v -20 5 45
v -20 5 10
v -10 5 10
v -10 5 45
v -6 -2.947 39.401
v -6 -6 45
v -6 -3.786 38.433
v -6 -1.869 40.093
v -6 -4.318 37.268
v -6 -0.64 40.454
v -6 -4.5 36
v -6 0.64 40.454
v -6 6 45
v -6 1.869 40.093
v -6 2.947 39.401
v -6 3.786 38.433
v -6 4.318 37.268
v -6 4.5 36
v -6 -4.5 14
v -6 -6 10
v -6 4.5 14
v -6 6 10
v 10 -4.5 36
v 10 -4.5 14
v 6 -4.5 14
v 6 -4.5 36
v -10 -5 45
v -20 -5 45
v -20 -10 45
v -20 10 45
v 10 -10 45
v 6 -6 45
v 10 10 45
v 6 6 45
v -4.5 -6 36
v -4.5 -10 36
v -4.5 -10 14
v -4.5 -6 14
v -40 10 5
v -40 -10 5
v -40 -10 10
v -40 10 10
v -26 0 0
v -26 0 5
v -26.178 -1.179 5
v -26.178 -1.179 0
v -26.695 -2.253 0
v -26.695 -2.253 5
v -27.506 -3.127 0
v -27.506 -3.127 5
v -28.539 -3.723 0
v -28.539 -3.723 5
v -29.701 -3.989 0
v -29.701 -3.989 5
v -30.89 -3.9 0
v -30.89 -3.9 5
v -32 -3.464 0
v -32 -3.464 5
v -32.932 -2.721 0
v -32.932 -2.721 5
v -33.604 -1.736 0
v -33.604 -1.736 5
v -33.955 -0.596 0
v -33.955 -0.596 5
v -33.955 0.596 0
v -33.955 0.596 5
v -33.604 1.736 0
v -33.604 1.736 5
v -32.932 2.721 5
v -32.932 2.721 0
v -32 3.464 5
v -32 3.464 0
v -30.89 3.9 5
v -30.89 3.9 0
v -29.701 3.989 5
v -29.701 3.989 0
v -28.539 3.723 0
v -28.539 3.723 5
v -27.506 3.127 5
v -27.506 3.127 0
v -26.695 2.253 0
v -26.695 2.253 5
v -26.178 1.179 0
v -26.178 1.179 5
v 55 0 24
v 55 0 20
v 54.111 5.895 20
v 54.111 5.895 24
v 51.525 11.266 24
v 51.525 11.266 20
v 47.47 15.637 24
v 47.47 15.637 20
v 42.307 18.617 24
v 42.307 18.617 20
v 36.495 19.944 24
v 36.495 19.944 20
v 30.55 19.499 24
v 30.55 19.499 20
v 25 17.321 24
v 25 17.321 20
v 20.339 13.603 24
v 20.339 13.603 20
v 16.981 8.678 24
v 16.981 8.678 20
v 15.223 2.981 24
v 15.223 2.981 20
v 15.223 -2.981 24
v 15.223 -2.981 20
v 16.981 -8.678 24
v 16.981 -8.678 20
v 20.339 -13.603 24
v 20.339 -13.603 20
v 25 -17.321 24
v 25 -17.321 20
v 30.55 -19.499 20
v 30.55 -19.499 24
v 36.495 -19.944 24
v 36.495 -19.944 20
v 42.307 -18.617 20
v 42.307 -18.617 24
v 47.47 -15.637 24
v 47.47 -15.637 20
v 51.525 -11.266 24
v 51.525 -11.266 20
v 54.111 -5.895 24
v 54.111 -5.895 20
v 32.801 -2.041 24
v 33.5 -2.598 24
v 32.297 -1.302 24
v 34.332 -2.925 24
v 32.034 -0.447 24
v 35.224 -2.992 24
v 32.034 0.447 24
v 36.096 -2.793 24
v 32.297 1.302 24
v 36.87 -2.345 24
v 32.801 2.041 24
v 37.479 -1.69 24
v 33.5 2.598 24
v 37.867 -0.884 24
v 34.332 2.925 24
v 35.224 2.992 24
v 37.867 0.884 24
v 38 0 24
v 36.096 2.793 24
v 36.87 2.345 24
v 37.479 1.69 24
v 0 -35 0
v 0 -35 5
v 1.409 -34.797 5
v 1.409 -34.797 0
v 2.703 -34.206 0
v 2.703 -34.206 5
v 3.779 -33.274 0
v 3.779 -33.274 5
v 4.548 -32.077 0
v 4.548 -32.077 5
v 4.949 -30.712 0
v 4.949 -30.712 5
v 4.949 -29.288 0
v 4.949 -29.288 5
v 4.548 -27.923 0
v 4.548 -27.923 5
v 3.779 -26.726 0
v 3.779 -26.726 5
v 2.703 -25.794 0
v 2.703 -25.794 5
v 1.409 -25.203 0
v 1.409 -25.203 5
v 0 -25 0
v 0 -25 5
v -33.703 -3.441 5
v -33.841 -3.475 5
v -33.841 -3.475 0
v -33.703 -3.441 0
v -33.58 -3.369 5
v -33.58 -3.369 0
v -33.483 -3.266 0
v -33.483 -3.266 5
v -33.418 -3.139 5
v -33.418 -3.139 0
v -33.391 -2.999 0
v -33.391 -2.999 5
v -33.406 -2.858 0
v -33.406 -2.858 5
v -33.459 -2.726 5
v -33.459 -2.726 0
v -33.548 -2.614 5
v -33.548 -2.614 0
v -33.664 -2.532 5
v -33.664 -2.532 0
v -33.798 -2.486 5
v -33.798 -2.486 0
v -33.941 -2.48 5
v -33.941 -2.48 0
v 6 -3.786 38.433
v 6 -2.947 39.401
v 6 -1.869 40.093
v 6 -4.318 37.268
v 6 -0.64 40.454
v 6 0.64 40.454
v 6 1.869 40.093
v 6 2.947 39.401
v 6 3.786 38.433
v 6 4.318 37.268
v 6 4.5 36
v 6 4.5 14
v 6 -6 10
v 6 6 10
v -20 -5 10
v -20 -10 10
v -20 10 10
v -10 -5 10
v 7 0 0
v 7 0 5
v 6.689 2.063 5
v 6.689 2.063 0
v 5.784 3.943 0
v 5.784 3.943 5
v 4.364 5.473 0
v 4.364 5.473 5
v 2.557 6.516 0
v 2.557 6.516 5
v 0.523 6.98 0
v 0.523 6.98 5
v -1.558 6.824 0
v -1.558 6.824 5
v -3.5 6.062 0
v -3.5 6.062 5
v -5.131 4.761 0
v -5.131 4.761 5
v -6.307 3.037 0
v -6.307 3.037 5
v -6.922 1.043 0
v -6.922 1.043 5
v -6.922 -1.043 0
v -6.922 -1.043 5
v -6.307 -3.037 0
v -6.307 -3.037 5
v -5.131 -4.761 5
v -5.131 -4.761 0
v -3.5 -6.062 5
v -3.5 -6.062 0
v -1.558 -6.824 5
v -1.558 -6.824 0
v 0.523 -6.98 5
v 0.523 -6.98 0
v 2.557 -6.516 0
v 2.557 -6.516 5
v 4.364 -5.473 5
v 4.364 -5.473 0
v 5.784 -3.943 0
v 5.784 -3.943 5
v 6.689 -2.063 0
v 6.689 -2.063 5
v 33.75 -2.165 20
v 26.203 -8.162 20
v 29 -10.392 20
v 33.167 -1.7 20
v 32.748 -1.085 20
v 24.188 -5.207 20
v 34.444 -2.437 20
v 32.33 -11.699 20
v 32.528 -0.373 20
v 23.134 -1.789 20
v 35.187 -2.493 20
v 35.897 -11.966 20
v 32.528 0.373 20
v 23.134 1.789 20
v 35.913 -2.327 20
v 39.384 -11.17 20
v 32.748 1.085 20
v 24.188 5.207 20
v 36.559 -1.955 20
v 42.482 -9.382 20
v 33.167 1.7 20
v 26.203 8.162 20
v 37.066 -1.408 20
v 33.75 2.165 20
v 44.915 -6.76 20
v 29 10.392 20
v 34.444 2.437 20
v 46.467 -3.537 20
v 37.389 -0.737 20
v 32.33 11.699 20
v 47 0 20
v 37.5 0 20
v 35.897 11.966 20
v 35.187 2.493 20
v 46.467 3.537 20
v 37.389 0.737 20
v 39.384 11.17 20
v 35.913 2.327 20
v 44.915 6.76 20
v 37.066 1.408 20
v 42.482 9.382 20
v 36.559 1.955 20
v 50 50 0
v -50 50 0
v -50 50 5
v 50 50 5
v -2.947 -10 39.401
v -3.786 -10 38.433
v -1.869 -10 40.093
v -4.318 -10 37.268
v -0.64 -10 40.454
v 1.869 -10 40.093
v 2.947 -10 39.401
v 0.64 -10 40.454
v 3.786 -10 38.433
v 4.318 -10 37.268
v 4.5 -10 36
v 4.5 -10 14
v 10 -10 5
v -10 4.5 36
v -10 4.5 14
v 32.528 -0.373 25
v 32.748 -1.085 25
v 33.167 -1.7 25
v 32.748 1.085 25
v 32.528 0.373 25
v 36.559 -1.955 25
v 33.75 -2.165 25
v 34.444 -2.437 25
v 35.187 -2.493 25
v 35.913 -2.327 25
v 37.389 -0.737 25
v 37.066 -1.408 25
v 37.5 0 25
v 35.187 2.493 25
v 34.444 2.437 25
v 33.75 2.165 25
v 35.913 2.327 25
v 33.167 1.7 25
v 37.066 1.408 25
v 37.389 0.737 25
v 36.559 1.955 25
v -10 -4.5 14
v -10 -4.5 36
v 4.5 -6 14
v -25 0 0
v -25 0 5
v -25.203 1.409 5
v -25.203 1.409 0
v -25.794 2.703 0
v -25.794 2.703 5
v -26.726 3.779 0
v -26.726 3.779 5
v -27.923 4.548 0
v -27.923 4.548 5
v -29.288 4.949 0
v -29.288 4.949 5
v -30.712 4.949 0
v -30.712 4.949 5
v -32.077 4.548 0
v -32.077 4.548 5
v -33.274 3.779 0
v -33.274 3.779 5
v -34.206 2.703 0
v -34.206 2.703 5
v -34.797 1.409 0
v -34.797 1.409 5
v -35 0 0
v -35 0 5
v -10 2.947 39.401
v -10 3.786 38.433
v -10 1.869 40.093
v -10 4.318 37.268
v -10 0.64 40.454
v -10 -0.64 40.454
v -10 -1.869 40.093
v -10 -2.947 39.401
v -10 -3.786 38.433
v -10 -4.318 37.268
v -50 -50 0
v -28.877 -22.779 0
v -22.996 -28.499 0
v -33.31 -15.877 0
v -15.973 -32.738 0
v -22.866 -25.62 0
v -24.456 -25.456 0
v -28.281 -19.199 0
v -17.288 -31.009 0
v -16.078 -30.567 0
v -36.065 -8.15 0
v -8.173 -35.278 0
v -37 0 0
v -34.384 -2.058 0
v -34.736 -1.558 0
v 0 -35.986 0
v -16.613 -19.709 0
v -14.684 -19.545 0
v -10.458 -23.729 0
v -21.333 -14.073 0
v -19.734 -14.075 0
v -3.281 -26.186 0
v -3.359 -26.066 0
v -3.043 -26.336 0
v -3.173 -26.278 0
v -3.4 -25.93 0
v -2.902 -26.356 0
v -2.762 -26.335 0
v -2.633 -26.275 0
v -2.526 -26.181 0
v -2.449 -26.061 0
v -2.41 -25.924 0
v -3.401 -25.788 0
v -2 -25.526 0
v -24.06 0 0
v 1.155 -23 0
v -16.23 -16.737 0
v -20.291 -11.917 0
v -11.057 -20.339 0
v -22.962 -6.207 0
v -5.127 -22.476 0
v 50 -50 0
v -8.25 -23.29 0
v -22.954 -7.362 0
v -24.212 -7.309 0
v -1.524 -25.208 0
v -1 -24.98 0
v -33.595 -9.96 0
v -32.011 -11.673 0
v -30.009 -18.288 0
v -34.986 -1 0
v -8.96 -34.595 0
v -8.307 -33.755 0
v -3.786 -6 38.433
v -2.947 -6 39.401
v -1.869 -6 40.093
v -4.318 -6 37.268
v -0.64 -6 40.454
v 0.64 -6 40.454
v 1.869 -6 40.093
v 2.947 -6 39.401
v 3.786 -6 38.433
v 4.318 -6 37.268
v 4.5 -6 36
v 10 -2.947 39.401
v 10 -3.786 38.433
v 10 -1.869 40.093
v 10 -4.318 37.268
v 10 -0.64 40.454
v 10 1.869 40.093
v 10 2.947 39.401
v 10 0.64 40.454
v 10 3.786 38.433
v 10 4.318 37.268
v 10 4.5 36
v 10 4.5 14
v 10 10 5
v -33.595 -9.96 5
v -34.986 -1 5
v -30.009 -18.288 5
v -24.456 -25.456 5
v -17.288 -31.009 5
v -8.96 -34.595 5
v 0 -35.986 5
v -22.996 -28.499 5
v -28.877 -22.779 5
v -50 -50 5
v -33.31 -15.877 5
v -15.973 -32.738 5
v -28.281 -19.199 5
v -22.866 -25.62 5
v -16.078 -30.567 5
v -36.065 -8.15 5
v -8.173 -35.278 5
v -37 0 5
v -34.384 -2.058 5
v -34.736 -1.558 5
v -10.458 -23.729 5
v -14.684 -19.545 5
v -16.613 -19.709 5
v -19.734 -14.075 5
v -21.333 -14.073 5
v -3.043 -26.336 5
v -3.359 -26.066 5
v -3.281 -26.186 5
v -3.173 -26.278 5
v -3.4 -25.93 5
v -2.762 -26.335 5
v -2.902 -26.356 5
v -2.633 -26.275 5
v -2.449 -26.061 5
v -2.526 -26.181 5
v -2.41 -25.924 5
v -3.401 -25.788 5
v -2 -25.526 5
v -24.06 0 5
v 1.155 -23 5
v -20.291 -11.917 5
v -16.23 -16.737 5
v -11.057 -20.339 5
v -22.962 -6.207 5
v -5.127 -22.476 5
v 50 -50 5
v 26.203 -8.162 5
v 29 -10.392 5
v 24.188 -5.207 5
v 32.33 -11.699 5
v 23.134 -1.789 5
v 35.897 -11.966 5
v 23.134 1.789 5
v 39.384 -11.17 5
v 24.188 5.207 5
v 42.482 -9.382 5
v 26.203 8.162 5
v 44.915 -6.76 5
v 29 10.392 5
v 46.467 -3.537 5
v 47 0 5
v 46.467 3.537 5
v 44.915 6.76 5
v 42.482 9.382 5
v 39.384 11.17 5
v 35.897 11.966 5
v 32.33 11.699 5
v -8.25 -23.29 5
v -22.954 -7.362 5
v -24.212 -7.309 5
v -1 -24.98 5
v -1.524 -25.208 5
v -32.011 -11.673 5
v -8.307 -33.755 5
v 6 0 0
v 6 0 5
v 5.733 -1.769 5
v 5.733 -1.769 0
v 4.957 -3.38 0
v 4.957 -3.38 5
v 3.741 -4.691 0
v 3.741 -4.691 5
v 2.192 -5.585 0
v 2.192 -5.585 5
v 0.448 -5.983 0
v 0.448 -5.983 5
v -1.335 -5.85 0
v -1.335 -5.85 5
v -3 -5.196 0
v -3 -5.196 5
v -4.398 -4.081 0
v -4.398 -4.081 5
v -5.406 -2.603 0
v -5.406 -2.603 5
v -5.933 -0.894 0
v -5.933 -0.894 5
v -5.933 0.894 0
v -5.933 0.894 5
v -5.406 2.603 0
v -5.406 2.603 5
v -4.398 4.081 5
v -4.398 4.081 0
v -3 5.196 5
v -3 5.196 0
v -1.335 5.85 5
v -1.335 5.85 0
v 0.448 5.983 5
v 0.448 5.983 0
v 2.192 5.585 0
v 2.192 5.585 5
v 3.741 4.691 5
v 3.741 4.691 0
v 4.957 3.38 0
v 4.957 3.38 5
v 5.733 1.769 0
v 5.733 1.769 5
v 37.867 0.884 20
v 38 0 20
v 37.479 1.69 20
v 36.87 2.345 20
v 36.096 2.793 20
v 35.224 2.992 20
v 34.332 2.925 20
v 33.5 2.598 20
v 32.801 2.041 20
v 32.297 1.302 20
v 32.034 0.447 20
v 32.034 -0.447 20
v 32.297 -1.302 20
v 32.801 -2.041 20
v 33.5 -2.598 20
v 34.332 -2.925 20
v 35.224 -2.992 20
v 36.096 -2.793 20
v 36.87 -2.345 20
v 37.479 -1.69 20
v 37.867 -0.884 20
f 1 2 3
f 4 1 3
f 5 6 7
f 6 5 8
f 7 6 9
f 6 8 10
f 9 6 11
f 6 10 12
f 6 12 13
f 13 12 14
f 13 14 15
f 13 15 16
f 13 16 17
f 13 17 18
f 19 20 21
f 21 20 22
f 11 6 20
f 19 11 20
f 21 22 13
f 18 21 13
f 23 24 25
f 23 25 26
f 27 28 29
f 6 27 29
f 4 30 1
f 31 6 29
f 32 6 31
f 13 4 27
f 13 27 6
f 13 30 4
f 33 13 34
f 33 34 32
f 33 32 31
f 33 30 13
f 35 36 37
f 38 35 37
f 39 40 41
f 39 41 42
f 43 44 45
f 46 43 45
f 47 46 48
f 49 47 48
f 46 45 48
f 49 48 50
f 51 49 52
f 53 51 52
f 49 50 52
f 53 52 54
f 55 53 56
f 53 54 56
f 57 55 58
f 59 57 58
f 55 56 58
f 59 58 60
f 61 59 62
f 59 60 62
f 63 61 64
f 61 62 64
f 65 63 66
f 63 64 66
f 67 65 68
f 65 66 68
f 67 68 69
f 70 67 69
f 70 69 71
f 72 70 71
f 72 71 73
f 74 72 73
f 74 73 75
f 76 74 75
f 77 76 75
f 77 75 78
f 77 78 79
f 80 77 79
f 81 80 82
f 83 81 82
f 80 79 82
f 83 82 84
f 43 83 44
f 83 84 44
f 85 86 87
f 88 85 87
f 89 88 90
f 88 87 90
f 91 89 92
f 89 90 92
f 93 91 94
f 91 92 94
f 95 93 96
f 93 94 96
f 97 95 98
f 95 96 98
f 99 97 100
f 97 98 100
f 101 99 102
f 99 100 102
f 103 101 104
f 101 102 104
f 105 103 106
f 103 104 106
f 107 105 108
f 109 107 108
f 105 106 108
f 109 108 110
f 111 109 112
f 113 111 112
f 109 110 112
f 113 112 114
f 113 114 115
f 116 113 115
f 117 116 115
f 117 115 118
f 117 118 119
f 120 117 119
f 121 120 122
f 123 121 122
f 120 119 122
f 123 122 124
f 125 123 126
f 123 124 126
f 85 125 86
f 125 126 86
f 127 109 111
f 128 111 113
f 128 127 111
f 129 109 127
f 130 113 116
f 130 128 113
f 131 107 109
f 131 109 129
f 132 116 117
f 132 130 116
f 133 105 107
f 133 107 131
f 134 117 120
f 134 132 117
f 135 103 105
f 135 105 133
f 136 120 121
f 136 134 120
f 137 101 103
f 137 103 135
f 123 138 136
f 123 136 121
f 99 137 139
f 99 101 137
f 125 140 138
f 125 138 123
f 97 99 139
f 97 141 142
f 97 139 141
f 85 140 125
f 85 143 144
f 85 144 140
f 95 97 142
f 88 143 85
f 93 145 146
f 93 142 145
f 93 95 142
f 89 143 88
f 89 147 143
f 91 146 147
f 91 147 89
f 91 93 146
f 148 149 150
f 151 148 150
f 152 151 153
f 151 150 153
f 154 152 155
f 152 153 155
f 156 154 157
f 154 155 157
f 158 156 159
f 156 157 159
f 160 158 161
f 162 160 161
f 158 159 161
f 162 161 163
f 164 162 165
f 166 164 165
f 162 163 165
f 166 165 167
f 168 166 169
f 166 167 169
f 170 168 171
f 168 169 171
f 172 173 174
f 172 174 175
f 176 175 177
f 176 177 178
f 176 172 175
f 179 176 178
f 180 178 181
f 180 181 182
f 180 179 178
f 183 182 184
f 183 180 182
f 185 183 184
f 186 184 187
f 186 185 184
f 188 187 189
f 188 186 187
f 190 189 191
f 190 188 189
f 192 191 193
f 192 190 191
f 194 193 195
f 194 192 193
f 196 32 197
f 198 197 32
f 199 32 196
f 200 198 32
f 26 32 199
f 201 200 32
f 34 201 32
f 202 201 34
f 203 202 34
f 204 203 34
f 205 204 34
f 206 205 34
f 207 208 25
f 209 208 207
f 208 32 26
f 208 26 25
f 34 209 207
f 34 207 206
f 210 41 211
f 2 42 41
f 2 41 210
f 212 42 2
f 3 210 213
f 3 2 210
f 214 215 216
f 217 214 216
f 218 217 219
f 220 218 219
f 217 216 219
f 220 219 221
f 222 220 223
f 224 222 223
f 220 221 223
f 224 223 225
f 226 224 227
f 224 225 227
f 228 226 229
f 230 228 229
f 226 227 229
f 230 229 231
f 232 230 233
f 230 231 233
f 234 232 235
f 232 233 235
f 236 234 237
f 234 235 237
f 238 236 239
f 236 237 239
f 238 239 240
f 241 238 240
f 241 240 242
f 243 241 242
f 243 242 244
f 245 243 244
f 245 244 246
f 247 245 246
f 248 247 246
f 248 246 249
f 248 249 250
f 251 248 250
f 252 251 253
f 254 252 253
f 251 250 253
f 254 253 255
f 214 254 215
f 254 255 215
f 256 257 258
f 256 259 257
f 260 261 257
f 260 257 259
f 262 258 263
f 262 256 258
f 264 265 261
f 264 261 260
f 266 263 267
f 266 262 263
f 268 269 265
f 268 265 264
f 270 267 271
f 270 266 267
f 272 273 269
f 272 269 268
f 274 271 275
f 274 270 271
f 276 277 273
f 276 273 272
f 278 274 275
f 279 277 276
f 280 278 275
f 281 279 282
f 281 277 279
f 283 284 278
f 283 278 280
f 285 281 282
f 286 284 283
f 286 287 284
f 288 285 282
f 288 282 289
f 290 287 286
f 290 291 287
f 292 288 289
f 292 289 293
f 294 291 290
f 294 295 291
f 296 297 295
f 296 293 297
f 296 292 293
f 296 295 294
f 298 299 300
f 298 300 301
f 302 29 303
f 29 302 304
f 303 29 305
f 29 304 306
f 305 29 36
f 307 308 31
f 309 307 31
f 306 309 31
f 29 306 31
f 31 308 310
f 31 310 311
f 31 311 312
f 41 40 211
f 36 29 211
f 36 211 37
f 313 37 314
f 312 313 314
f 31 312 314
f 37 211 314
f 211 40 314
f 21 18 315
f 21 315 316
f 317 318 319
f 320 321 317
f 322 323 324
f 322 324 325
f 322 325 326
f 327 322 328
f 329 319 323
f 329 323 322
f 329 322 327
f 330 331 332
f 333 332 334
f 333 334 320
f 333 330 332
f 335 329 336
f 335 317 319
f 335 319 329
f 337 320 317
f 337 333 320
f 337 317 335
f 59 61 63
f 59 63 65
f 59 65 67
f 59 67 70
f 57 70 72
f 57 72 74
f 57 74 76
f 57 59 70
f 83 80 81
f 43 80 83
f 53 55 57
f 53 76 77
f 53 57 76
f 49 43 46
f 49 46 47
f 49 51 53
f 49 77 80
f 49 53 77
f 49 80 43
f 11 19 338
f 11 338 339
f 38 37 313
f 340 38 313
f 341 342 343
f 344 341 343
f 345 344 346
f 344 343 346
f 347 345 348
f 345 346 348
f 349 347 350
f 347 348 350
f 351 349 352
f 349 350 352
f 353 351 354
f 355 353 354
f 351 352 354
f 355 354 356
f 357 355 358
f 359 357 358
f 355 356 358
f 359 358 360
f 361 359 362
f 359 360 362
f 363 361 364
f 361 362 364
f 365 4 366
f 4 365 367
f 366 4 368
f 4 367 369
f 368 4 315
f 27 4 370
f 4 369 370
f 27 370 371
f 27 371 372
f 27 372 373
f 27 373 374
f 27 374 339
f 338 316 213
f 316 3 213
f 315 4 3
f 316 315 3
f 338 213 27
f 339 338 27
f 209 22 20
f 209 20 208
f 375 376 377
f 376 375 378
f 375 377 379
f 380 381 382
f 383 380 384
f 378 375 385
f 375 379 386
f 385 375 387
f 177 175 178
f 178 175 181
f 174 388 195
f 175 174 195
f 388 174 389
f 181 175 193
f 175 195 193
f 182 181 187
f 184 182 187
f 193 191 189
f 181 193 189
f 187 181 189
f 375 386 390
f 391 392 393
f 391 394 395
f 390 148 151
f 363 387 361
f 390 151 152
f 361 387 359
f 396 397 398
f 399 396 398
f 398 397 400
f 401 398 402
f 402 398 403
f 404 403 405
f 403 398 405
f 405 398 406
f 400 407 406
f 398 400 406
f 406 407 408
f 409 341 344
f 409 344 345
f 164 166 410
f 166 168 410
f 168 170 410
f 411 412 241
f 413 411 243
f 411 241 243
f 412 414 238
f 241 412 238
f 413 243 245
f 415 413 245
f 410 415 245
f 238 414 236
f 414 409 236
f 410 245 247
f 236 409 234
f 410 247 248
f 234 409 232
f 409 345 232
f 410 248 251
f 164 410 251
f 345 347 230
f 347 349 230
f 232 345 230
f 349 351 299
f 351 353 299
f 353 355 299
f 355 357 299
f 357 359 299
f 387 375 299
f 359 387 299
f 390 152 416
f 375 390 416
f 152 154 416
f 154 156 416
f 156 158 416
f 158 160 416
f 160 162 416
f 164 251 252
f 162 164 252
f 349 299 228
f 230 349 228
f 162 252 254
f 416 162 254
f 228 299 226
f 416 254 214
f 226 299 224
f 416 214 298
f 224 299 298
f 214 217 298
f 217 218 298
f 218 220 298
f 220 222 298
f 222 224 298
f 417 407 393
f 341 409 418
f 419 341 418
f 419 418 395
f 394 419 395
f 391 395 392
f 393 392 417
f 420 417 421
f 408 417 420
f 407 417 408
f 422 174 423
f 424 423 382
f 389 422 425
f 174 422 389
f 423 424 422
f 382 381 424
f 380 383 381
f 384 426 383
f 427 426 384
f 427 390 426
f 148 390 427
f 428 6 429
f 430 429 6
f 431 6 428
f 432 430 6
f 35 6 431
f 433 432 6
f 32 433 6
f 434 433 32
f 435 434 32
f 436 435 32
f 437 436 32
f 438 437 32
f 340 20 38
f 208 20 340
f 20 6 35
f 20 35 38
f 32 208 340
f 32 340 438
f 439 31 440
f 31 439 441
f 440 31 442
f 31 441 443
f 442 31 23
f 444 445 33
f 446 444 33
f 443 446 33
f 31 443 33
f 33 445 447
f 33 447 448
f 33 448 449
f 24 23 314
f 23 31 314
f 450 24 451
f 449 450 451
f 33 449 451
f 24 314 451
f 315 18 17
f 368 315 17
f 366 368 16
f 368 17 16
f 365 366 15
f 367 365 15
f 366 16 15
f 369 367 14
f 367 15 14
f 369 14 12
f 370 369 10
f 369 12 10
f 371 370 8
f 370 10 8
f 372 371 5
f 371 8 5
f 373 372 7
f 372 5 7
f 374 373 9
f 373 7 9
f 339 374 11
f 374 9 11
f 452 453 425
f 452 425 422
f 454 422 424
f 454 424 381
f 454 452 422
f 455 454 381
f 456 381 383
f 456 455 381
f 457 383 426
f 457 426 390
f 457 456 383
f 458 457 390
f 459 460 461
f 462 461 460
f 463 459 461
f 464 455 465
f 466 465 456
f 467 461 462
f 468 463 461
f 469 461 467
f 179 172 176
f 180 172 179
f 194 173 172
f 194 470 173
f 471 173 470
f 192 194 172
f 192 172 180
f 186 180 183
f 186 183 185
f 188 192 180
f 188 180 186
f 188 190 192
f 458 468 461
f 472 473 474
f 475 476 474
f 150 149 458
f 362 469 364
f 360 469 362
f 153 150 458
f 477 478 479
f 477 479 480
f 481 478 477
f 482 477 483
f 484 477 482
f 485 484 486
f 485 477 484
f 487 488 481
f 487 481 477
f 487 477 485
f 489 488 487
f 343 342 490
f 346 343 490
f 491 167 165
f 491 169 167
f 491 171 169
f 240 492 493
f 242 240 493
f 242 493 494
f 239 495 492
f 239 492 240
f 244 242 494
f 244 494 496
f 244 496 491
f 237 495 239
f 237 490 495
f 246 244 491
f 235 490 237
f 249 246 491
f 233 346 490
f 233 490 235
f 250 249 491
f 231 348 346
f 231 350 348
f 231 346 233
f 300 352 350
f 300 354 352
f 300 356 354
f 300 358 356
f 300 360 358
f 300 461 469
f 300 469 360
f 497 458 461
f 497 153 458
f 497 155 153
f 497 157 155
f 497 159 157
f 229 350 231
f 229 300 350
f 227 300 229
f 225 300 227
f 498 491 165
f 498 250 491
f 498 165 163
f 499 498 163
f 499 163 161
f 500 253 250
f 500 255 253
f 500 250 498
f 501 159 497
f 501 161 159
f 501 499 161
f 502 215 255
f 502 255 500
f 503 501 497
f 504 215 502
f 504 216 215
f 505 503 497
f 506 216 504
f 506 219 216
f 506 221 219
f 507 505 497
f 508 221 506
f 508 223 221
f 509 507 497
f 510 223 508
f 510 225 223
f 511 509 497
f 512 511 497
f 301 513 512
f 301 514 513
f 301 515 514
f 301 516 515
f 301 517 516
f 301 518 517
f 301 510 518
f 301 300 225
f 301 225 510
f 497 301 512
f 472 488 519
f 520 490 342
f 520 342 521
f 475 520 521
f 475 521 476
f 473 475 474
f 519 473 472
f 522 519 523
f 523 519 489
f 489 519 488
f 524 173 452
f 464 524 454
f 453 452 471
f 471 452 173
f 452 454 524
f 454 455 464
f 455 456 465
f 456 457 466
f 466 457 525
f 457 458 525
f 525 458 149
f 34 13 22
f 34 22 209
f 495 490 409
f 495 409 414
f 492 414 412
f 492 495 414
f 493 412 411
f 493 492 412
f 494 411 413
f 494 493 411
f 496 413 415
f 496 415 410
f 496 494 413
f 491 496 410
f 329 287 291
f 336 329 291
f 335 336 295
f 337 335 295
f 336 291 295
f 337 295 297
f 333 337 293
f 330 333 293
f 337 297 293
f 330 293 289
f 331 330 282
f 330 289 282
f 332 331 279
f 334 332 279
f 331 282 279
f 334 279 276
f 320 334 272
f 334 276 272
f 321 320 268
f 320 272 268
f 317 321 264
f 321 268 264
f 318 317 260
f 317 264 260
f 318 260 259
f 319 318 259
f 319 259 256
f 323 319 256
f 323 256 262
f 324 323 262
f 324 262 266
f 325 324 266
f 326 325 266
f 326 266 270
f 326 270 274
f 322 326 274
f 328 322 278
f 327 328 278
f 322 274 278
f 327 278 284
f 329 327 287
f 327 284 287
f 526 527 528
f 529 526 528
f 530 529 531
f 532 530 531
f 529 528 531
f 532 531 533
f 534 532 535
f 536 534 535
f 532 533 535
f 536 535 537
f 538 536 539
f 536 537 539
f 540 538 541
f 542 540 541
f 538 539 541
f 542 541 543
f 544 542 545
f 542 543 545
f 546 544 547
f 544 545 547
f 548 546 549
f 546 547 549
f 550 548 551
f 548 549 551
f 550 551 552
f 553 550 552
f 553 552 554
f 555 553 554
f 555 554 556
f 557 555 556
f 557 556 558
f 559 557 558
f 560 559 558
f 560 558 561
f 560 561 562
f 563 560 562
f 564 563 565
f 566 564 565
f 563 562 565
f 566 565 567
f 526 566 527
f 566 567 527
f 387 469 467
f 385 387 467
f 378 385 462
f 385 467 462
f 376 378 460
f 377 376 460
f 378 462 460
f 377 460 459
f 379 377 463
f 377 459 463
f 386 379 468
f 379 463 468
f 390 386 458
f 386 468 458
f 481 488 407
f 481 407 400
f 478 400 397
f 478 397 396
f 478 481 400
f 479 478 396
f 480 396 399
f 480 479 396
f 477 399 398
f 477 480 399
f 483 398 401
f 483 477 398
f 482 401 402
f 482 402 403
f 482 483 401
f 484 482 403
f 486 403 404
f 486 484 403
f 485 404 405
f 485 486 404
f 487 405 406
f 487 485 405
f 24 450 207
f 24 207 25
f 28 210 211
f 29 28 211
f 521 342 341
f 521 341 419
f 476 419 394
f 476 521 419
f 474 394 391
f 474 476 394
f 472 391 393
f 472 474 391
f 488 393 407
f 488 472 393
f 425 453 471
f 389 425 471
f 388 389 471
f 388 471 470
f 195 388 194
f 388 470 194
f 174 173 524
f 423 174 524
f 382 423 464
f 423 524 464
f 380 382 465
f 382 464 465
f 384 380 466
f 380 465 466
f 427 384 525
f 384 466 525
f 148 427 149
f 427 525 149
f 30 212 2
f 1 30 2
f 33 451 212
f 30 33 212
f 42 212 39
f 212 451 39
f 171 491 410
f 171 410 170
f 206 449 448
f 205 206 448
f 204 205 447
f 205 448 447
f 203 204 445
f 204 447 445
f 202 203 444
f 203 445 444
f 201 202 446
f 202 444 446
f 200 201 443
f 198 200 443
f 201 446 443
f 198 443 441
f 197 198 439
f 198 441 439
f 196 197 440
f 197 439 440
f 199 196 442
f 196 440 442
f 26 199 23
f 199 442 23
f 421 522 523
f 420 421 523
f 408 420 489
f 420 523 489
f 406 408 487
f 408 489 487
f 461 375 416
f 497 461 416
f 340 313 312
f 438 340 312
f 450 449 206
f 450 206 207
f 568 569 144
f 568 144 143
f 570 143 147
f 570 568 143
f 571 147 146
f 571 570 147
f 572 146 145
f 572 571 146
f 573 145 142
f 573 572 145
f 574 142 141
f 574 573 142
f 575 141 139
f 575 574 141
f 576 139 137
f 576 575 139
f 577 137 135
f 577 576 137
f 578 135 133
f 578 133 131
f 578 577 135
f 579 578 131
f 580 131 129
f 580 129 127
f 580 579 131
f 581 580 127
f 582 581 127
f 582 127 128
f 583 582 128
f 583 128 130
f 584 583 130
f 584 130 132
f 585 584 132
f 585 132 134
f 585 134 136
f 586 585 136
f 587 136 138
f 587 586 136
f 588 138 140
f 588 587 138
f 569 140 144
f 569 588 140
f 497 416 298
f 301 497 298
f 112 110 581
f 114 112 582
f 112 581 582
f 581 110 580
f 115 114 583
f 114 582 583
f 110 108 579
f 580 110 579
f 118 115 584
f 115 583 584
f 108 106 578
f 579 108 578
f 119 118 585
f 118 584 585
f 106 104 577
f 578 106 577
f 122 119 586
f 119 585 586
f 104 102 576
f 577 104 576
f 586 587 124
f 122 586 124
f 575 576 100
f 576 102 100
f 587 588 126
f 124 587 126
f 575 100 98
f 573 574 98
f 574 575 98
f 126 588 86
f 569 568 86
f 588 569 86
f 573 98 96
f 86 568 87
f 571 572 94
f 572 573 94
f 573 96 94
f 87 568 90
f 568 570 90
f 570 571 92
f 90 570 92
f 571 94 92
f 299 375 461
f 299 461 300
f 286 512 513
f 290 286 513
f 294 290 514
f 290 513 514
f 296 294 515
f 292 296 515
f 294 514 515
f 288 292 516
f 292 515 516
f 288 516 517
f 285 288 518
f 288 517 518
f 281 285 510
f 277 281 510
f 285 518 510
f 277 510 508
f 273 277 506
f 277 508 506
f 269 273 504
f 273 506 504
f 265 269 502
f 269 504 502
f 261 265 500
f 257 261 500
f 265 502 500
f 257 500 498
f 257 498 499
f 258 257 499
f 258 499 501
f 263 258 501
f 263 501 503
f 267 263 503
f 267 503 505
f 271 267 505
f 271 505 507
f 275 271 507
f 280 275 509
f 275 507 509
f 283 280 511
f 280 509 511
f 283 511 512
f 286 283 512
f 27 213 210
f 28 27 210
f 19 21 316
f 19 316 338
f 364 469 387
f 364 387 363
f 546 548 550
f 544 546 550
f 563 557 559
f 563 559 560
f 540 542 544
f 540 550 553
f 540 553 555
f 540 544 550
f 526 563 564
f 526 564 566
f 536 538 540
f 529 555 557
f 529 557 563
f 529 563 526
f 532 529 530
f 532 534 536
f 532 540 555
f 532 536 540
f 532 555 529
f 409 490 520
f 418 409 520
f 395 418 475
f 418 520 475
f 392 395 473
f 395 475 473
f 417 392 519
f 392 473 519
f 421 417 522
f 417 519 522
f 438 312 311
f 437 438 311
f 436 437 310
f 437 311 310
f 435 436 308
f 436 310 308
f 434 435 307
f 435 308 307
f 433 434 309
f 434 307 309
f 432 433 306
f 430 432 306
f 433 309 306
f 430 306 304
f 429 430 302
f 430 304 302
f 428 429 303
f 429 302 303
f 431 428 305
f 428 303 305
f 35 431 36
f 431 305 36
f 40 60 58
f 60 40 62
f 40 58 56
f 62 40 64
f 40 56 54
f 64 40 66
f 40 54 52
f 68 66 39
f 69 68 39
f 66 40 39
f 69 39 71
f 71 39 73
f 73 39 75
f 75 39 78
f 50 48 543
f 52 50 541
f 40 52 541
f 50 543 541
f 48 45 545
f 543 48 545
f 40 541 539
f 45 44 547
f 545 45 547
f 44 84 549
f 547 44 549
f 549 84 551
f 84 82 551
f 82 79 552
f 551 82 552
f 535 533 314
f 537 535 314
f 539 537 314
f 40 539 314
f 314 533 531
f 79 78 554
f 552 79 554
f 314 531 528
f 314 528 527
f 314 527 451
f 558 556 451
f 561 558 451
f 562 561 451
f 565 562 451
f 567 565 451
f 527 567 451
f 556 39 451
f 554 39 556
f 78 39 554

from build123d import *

# Parameters (mm, degrees)
SKETCH_W        = 100
SKETCH_H        = 100
PAD_DEPTH       = 5
SKETCH001_R     = 7
POCKET_DEPTH    = 5
SKETCH007_R     = 12
PAD004_DEPTH    = 15
SKETCH008_R     = 2.5
PAD005_DEPTH    = 5
SKETCH002_W     = 50
SKETCH002_H     = 20
PAD001_DEPTH    = 5
SKETCH003_R     = 6
SKETCH003_R_2   = 4
PAD002_DEPTH    = 5
SKETCH004_W     = 12
SKETCH004_H     = 12
PAD003_DEPTH    = 35
POCKET001_DEPTH = 20
POCKET002_DEPTH = 4
SKETCH009_R     = 20
SKETCH009_R_2   = 3
PAD006_DEPTH    = 4


with BuildPart() as plt:
    # Sketch → Pad (new body)
    with BuildSketch(Plane.XY):
        Rectangle(SKETCH_W, SKETCH_H)
    extrude(amount=PAD_DEPTH)

    # Sketch001 (on Face6 of Pad) → Pocket (cut)
    with BuildSketch(Plane.XY.offset(5)):
        Circle(SKETCH001_R)
        with BuildLine():
            ThreePointArc((-25, 0), (-30, 5), (-35, 0))
            Line((-37, 0), (-35, 0))
            ThreePointArc((-37, 0), (-26.099801, -25.806976), (0, -35.986108))
            ThreePointArc((-34.986108, -1), (-24.455844, -25.455844), (0, -35.986108))
            ThreePointArc((-34.986108, -1), (-34.572138, -1.816852), (-33.940654, -2.480062))
            ThreePointArc((-33.841405, -3.475124), (-33.393498, -2.927969), (-33.940654, -2.480062))
            ThreePointArc((-33.841405, -3.475124), (-22.86642, -25.620187), (0, -35))
            ThreePointArc((0, -35), (5, -30), (0, -25))
            Line((1.154701, -23), (0, -25))
            ThreePointArc((-24.059928, 0), (-16.229983, -16.737374), (1.154701, -23))
            ThreePointArc((-24.059928, 0), (-17.41358, -16.998237), (-1, -24.979992))
            ThreePointArc((-1, -24.979992), (-1.769218, -25.356079), (-2.410271, -25.923695))
            ThreePointArc((-3.40099, -25.787765), (-2.973596, -26.351089), (-2.410271, -25.923695))
            ThreePointArc((-25, 0), (-19.180882, -17.065296), (-3.40099, -25.787765))
        make_face()
    extrude(amount=-POCKET_DEPTH, mode=Mode.SUBTRACT)

    # Sketch007 (on Face5 of Pocket) → Pad004 (join)
    with BuildSketch(Plane.XY.offset(5)):
        with Locations((35, 0)):
            Circle(SKETCH007_R)
    extrude(amount=PAD004_DEPTH)

    # Sketch008 (on Face23 of Pad004) → Pad005 (join)
    with BuildSketch(Plane.XY.offset(20)):
        with Locations((35, 0)):
            Circle(SKETCH008_R)
    extrude(amount=PAD005_DEPTH)


with BuildPart() as der:
    # Sketch002 (on Face1 of CopyPocket) → Pad001 (new body)
    with BuildSketch(Plane.XY.offset(5)):
        with Locations((-15, 0)):
            Rectangle(SKETCH002_W, SKETCH002_H)
    extrude(amount=PAD001_DEPTH)

    # Sketch003 (on Face5 of Pad001) → Pad002 (join)
    with BuildSketch(Plane(origin=(0, 0, 5), x_dir=(1, 0, 0), z_dir=(0, 0, -1))):
        Circle(SKETCH003_R)
        with Locations((-30, 0)):
            Circle(SKETCH003_R_2)
    extrude(amount=PAD002_DEPTH)

    # Sketch004 (on Face5 of Pad002) → Pad003 (join)
    with BuildSketch(Plane.XY.offset(10)):
        Polygon((10, 10), (-20, 10), (-20, 5), (-10, 5), (-10, -5), (-20, -5), (-20, -10), (10, -10), align=None)
        Rectangle(SKETCH004_W, SKETCH004_H, mode=Mode.SUBTRACT)
    extrude(amount=PAD003_DEPTH)

    # Sketch005 (on Face10 of Pad003) → Pocket001 (cut)
    with BuildSketch(Plane.YZ.offset(10)):
        with BuildLine():
            Line((4.5, 14), (-4.5, 14))
            Line((-4.5, 14), (-4.5, 36))
            ThreePointArc((4.5, 36), (0, 40.5), (-4.5, 36))
            Line((4.5, 36), (4.5, 14))
        make_face()
    extrude(amount=-POCKET001_DEPTH, mode=Mode.SUBTRACT)

    # Sketch006 (on Face11 of Pocket001) → Pocket002 (cut)
    with BuildSketch(Plane.XZ.offset(10)):
        with BuildLine():
            Line((-4.5, 14), (4.5, 14))
            Line((4.5, 14), (4.5, 36))
            ThreePointArc((4.5, 36), (0, 40.5), (-4.5, 36))
            Line((-4.5, 36), (-4.5, 14))
        make_face()
    extrude(amount=-POCKET002_DEPTH, mode=Mode.SUBTRACT)


with BuildPart() as body004:
    # Sketch009 (on Face1 of CopyPad005) → Pad006 (new body)
    with BuildSketch(Plane.XY.offset(20)):
        with Locations((35, 0)):
            Circle(SKETCH009_R)
        with Locations((35, 0)):
            Circle(SKETCH009_R_2, mode=Mode.SUBTRACT)
    extrude(amount=PAD006_DEPTH)


solid = Compound([plt.part, der.part, body004.part])
